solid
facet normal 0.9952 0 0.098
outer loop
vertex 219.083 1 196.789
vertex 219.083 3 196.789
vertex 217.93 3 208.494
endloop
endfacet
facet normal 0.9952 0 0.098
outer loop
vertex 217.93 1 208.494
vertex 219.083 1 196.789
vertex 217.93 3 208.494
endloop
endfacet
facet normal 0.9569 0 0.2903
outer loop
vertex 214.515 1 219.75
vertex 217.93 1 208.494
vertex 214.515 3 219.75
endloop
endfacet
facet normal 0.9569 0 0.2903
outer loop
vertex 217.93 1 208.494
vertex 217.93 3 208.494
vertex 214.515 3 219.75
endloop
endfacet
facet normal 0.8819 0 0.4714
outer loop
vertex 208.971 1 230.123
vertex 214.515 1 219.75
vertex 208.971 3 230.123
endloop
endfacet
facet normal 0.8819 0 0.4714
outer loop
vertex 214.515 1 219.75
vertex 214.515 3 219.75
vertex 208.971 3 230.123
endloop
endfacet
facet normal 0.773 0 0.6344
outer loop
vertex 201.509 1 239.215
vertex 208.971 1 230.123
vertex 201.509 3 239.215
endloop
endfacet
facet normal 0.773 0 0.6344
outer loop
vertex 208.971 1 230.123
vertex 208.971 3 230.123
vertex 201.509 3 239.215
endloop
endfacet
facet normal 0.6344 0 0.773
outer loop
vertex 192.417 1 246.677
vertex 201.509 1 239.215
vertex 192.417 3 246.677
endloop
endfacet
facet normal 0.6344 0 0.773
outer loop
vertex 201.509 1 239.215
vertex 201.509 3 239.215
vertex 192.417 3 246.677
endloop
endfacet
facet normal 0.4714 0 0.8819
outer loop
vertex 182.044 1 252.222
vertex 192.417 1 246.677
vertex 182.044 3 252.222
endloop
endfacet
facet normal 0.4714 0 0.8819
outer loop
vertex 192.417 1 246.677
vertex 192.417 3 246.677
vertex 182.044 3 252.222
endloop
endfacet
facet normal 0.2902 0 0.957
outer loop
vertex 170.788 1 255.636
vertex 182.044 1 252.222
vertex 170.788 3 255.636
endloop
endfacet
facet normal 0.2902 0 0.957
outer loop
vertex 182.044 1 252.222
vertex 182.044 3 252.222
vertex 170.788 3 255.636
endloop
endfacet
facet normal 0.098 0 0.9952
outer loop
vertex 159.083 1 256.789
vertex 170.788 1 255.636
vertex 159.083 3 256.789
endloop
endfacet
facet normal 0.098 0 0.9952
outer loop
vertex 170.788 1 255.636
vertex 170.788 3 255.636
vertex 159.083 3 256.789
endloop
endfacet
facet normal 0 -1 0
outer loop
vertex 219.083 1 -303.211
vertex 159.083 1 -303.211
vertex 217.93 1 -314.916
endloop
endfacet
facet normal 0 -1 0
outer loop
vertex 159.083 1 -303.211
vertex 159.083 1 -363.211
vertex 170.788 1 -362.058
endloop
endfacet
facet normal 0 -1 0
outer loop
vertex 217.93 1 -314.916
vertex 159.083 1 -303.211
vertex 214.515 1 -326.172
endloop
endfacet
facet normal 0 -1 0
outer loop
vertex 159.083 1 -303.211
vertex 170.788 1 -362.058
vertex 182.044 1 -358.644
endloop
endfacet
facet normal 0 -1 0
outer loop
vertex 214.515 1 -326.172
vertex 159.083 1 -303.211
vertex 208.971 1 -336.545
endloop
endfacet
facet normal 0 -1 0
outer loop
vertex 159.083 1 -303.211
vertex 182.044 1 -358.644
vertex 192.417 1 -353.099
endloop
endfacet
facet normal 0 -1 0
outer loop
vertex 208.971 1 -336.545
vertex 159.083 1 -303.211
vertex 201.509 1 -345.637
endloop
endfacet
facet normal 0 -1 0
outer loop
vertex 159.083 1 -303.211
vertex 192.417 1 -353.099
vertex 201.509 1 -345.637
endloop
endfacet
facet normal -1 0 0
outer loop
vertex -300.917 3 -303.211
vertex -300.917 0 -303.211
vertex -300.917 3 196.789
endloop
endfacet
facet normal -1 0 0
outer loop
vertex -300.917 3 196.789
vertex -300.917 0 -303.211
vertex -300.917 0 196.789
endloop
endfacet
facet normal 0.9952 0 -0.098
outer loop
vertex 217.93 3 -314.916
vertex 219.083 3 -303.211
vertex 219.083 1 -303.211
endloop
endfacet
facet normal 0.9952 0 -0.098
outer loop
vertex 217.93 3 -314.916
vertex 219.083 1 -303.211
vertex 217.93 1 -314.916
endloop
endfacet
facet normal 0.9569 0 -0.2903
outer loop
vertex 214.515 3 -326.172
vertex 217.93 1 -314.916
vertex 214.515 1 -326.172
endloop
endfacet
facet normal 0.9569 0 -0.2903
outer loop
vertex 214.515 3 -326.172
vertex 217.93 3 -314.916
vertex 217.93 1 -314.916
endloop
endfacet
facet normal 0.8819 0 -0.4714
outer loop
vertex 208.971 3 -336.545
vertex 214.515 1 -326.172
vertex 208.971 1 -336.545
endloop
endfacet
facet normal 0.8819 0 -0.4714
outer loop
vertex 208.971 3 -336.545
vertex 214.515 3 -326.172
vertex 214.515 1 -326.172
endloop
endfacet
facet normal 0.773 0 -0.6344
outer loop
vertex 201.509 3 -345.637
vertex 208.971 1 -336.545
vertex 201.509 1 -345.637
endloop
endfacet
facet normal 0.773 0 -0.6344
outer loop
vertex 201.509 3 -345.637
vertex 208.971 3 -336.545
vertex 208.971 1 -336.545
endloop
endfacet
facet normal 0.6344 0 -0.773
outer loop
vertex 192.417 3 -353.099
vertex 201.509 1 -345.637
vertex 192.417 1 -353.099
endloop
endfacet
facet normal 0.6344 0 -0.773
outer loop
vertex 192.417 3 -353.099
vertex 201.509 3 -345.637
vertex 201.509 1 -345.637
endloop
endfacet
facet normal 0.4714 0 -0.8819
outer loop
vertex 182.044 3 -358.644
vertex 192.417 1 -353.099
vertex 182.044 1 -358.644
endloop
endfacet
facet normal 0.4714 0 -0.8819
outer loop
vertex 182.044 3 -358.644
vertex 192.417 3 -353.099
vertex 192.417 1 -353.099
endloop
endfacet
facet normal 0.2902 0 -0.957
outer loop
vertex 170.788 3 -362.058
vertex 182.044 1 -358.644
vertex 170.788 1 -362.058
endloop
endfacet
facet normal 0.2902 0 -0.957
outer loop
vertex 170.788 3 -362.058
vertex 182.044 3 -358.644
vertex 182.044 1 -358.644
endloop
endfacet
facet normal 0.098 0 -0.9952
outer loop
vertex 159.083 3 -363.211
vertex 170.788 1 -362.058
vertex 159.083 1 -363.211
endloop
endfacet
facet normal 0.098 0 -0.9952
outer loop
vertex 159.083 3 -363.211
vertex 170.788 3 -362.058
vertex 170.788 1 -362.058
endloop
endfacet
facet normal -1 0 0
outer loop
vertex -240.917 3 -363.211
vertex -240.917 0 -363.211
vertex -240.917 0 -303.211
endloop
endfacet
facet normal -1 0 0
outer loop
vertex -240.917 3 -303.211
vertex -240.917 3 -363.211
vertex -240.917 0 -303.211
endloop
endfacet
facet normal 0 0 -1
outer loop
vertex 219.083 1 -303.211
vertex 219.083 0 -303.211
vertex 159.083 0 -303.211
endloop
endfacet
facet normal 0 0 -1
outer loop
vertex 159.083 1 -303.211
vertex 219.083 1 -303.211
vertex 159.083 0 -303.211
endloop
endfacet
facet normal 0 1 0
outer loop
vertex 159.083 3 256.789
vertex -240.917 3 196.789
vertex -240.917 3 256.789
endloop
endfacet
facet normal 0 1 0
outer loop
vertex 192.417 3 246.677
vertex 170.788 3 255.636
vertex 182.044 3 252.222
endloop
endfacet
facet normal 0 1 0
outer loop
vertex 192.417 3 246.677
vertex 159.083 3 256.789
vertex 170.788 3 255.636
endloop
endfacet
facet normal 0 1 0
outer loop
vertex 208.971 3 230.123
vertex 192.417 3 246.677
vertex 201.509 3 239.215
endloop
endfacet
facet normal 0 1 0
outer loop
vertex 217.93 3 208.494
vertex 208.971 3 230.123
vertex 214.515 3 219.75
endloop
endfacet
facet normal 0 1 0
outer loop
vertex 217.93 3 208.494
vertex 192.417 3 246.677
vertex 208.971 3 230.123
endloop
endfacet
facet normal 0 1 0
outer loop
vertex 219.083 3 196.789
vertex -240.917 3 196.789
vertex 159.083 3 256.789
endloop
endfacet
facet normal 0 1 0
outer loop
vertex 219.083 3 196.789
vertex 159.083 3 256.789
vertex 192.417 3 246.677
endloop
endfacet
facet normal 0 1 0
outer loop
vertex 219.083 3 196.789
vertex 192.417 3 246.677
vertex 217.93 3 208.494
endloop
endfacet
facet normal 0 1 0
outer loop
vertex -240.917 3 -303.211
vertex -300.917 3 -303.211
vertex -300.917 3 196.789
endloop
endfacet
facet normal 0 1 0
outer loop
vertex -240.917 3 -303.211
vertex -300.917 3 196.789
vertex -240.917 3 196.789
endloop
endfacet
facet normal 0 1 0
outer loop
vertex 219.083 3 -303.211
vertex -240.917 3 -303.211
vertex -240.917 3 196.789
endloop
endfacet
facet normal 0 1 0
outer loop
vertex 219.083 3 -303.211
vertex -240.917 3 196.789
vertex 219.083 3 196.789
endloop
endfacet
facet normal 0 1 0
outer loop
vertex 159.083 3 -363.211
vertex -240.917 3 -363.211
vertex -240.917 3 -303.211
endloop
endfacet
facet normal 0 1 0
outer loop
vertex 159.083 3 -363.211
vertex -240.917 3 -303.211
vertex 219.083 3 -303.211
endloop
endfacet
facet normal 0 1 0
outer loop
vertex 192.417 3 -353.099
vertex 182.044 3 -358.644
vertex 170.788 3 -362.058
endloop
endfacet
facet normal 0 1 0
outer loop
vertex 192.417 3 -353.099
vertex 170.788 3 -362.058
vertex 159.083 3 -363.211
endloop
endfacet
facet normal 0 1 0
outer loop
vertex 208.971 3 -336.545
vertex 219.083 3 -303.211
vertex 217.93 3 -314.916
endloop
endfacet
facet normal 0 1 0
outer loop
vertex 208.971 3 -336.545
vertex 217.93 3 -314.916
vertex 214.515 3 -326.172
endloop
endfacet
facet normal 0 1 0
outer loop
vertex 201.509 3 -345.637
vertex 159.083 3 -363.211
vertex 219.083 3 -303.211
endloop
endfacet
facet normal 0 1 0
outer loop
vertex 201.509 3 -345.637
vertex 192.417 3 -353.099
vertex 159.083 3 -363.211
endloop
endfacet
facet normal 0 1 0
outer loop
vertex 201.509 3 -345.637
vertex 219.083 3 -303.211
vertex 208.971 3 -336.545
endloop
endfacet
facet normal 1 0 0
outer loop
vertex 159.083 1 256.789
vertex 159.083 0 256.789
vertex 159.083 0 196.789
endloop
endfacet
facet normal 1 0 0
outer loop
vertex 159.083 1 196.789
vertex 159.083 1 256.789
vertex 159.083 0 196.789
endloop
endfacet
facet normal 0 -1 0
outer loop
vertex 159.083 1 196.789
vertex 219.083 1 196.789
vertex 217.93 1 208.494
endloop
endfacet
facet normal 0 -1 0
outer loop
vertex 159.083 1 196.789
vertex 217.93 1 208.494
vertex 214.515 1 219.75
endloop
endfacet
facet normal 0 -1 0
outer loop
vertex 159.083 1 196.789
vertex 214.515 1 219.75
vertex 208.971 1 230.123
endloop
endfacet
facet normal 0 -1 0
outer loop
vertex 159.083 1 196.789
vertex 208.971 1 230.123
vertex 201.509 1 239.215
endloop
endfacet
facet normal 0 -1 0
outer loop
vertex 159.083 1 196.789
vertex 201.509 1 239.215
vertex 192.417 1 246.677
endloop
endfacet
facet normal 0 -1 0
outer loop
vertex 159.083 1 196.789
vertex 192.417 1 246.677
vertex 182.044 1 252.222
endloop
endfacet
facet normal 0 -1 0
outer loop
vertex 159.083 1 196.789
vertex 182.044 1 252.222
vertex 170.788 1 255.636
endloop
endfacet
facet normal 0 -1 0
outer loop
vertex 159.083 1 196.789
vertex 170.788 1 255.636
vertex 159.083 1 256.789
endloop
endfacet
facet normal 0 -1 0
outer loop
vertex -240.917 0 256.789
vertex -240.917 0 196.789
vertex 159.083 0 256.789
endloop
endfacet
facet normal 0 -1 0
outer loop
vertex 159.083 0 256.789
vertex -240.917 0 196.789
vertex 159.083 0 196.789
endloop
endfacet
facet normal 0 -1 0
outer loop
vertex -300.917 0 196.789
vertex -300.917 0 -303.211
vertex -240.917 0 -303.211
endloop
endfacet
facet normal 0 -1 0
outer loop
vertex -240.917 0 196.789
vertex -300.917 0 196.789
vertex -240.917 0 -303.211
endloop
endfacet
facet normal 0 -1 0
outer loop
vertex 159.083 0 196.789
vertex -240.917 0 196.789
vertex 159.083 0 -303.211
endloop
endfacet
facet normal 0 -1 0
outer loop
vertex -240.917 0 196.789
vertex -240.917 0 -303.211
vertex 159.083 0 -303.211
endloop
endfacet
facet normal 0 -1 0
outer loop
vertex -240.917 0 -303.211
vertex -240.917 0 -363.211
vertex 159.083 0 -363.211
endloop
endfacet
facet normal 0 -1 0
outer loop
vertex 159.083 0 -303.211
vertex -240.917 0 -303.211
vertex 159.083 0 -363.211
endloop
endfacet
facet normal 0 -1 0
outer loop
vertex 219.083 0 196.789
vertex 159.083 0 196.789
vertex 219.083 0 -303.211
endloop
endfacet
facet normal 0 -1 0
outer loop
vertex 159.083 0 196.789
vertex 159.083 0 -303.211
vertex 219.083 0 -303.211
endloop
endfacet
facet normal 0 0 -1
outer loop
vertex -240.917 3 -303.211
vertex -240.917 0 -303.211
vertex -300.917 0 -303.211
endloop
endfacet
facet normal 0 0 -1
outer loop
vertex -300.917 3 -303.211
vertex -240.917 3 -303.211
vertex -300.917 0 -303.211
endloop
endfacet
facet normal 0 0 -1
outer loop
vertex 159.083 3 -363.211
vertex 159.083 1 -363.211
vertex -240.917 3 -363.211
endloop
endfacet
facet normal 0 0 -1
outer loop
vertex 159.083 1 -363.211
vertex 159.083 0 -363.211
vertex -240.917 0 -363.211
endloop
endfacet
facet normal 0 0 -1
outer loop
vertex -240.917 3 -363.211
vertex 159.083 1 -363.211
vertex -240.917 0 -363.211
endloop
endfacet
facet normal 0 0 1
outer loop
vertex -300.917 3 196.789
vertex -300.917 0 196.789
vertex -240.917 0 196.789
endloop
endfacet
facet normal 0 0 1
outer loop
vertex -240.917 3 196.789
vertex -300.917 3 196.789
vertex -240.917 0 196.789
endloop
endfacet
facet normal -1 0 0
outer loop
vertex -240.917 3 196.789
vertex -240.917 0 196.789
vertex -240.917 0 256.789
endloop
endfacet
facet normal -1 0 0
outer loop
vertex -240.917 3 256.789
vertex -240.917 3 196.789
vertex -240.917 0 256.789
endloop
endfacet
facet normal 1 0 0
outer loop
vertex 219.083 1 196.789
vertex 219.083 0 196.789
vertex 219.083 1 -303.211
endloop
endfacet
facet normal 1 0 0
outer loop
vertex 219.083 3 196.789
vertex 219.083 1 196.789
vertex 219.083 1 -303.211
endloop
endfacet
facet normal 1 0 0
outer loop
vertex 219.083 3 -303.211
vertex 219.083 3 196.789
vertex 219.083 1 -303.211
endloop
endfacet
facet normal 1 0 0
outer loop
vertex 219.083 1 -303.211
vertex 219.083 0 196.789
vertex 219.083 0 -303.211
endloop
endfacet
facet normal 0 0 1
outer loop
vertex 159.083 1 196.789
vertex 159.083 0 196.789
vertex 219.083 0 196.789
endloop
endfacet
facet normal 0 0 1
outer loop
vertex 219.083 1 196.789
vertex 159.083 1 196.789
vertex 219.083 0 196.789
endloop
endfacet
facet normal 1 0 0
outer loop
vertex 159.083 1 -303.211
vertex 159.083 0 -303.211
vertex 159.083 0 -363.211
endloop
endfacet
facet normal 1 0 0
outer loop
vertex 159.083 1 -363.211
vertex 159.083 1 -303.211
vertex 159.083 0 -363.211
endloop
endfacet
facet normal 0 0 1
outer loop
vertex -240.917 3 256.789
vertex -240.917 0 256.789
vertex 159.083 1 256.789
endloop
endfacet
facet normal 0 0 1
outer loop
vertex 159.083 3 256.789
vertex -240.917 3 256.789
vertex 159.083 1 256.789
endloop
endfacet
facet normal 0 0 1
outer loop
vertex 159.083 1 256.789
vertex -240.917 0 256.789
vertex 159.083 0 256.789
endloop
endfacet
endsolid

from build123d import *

# Parameters (mm, degrees)
EXTRUDE_1_DEPTH = 3
EXTRUDE_2_DEPTH = 2


with BuildPart() as part:
    # 草图1 → 凸台-拉伸1 (new body)
    with BuildSketch(Plane(origin=(0, 0, 0), x_dir=(1, 0, 0), z_dir=(0, 1, 0))):
        Polygon((-240.917431193, -196.788990826), (-240.917431193, -256.788990826), (159.082568807, -256.788990826), (159.082568807, -196.788990826), (219.082568807, -196.788990826), (219.082568807, 303.211009174), (159.082568807, 303.211009174), (159.082568807, 363.211009174), (-240.917431193, 363.211009174), (-240.917431193, 303.211009174), (-300.917431193, 303.211009174), (-300.917431193, -196.788990826), align=None)
    extrude(amount=EXTRUDE_1_DEPTH)

    # 草图2 → 凸台-拉伸2 (add)
    with BuildSketch(Plane(origin=(0, 3, 0), x_dir=(1, 0, 0), z_dir=(0, 1, 0))):
        with BuildLine():
            Line((159.082568807, 303.211009174), (219.082568807, 303.211009174))
            ThreePointArc((219.082568807, 303.211009174), (201.508975679, 345.637416046), (159.082568807, 363.211009174))
            Line((159.082568807, 363.211009174), (159.082568807, 303.211009174))
        make_face()
        with BuildLine():
            Line((159.082568807, -256.788990826), (159.082568807, -196.788990826))
            Line((159.082568807, -196.788990826), (219.082568807, -196.788990826))
            ThreePointArc((219.082568807, -196.788990826), (201.508975679, -239.215397697), (159.082568807, -256.788990826))
        make_face()
    extrude(amount=-EXTRUDE_2_DEPTH)


solid = part.part
